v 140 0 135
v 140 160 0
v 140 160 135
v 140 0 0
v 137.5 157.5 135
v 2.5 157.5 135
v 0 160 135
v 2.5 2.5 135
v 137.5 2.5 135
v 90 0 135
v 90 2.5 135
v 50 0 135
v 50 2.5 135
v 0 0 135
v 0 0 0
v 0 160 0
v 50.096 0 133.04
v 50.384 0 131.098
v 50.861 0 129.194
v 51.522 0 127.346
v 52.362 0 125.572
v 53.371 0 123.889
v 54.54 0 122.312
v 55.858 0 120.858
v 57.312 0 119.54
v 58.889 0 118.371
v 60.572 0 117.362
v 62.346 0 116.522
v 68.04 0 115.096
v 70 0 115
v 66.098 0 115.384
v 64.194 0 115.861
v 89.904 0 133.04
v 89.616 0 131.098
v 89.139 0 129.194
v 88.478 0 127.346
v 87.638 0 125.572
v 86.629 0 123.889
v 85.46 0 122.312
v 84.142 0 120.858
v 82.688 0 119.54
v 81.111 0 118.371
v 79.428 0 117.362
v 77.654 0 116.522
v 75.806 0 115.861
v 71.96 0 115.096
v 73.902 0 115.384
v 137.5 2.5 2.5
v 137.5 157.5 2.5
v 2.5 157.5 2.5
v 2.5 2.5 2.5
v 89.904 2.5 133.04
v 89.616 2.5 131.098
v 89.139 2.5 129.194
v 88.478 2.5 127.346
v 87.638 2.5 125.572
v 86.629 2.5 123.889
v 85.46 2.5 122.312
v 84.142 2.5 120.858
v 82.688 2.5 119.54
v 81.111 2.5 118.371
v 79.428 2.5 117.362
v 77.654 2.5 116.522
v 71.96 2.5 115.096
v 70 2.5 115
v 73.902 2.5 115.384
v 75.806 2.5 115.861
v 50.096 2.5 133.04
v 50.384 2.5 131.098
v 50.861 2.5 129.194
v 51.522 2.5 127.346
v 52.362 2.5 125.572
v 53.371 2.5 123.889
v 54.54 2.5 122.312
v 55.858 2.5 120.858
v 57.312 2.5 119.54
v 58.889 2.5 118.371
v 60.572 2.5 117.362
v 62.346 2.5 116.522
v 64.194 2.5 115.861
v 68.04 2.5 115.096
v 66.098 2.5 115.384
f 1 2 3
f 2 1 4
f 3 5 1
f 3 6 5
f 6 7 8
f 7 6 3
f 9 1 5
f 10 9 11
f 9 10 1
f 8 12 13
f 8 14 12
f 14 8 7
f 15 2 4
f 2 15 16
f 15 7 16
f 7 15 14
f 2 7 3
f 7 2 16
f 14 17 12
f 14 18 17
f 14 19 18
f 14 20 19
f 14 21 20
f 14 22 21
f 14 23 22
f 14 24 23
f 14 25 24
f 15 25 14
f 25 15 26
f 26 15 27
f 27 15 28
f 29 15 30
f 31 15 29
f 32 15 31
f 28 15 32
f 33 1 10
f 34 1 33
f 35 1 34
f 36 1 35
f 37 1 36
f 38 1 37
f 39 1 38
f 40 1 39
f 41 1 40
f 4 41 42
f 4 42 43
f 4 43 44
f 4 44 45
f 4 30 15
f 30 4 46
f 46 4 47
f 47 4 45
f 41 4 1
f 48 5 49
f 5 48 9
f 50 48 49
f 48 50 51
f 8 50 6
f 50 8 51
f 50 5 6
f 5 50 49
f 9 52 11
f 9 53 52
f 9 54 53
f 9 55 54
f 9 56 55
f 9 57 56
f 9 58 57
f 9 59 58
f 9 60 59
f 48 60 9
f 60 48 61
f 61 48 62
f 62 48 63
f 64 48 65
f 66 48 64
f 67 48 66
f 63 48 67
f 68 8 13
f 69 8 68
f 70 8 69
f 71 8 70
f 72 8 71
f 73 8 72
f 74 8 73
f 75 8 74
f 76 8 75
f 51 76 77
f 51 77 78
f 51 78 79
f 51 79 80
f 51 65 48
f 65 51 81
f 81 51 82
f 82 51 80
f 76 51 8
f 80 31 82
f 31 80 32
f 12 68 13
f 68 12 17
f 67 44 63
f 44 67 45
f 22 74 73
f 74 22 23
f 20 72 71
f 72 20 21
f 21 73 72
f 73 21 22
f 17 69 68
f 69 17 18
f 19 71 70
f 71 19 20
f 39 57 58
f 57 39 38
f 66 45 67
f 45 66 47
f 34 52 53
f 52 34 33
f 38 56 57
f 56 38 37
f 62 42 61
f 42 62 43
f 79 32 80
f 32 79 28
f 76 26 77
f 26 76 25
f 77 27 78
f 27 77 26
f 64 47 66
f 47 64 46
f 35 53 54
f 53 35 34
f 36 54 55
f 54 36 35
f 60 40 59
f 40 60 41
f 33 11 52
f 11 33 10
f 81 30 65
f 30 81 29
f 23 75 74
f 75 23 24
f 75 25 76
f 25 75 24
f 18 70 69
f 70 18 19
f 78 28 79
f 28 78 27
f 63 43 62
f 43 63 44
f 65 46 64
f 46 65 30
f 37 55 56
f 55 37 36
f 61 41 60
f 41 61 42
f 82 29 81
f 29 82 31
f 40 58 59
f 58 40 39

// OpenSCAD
// cd stand sort box
// 08.10.2026 Sebastian Weigl
 
// set the fregment sizes
$fn = $preview ? 48 : 64;

// vars
border=2.5;
clearence=0.5;

// outer var
fir_box_width=140;
fir_box_depth=160;
fir_box_height=135;

// inner var
sec_box_width=fir_box_width-(border+border);
sec_box_depth=fir_box_depth-(border+border);
sec_box_height=fir_box_height-(border);

difference() {
cube([fir_box_width,fir_box_depth,fir_box_height],false);
  translate([border,border,border])
    #cube([sec_box_width,sec_box_depth,sec_box_height],false);
  translate([fir_box_width/2,0,fir_box_height])
  rotate([90])
    #cylinder(h=20,r=20,center=true);
}
